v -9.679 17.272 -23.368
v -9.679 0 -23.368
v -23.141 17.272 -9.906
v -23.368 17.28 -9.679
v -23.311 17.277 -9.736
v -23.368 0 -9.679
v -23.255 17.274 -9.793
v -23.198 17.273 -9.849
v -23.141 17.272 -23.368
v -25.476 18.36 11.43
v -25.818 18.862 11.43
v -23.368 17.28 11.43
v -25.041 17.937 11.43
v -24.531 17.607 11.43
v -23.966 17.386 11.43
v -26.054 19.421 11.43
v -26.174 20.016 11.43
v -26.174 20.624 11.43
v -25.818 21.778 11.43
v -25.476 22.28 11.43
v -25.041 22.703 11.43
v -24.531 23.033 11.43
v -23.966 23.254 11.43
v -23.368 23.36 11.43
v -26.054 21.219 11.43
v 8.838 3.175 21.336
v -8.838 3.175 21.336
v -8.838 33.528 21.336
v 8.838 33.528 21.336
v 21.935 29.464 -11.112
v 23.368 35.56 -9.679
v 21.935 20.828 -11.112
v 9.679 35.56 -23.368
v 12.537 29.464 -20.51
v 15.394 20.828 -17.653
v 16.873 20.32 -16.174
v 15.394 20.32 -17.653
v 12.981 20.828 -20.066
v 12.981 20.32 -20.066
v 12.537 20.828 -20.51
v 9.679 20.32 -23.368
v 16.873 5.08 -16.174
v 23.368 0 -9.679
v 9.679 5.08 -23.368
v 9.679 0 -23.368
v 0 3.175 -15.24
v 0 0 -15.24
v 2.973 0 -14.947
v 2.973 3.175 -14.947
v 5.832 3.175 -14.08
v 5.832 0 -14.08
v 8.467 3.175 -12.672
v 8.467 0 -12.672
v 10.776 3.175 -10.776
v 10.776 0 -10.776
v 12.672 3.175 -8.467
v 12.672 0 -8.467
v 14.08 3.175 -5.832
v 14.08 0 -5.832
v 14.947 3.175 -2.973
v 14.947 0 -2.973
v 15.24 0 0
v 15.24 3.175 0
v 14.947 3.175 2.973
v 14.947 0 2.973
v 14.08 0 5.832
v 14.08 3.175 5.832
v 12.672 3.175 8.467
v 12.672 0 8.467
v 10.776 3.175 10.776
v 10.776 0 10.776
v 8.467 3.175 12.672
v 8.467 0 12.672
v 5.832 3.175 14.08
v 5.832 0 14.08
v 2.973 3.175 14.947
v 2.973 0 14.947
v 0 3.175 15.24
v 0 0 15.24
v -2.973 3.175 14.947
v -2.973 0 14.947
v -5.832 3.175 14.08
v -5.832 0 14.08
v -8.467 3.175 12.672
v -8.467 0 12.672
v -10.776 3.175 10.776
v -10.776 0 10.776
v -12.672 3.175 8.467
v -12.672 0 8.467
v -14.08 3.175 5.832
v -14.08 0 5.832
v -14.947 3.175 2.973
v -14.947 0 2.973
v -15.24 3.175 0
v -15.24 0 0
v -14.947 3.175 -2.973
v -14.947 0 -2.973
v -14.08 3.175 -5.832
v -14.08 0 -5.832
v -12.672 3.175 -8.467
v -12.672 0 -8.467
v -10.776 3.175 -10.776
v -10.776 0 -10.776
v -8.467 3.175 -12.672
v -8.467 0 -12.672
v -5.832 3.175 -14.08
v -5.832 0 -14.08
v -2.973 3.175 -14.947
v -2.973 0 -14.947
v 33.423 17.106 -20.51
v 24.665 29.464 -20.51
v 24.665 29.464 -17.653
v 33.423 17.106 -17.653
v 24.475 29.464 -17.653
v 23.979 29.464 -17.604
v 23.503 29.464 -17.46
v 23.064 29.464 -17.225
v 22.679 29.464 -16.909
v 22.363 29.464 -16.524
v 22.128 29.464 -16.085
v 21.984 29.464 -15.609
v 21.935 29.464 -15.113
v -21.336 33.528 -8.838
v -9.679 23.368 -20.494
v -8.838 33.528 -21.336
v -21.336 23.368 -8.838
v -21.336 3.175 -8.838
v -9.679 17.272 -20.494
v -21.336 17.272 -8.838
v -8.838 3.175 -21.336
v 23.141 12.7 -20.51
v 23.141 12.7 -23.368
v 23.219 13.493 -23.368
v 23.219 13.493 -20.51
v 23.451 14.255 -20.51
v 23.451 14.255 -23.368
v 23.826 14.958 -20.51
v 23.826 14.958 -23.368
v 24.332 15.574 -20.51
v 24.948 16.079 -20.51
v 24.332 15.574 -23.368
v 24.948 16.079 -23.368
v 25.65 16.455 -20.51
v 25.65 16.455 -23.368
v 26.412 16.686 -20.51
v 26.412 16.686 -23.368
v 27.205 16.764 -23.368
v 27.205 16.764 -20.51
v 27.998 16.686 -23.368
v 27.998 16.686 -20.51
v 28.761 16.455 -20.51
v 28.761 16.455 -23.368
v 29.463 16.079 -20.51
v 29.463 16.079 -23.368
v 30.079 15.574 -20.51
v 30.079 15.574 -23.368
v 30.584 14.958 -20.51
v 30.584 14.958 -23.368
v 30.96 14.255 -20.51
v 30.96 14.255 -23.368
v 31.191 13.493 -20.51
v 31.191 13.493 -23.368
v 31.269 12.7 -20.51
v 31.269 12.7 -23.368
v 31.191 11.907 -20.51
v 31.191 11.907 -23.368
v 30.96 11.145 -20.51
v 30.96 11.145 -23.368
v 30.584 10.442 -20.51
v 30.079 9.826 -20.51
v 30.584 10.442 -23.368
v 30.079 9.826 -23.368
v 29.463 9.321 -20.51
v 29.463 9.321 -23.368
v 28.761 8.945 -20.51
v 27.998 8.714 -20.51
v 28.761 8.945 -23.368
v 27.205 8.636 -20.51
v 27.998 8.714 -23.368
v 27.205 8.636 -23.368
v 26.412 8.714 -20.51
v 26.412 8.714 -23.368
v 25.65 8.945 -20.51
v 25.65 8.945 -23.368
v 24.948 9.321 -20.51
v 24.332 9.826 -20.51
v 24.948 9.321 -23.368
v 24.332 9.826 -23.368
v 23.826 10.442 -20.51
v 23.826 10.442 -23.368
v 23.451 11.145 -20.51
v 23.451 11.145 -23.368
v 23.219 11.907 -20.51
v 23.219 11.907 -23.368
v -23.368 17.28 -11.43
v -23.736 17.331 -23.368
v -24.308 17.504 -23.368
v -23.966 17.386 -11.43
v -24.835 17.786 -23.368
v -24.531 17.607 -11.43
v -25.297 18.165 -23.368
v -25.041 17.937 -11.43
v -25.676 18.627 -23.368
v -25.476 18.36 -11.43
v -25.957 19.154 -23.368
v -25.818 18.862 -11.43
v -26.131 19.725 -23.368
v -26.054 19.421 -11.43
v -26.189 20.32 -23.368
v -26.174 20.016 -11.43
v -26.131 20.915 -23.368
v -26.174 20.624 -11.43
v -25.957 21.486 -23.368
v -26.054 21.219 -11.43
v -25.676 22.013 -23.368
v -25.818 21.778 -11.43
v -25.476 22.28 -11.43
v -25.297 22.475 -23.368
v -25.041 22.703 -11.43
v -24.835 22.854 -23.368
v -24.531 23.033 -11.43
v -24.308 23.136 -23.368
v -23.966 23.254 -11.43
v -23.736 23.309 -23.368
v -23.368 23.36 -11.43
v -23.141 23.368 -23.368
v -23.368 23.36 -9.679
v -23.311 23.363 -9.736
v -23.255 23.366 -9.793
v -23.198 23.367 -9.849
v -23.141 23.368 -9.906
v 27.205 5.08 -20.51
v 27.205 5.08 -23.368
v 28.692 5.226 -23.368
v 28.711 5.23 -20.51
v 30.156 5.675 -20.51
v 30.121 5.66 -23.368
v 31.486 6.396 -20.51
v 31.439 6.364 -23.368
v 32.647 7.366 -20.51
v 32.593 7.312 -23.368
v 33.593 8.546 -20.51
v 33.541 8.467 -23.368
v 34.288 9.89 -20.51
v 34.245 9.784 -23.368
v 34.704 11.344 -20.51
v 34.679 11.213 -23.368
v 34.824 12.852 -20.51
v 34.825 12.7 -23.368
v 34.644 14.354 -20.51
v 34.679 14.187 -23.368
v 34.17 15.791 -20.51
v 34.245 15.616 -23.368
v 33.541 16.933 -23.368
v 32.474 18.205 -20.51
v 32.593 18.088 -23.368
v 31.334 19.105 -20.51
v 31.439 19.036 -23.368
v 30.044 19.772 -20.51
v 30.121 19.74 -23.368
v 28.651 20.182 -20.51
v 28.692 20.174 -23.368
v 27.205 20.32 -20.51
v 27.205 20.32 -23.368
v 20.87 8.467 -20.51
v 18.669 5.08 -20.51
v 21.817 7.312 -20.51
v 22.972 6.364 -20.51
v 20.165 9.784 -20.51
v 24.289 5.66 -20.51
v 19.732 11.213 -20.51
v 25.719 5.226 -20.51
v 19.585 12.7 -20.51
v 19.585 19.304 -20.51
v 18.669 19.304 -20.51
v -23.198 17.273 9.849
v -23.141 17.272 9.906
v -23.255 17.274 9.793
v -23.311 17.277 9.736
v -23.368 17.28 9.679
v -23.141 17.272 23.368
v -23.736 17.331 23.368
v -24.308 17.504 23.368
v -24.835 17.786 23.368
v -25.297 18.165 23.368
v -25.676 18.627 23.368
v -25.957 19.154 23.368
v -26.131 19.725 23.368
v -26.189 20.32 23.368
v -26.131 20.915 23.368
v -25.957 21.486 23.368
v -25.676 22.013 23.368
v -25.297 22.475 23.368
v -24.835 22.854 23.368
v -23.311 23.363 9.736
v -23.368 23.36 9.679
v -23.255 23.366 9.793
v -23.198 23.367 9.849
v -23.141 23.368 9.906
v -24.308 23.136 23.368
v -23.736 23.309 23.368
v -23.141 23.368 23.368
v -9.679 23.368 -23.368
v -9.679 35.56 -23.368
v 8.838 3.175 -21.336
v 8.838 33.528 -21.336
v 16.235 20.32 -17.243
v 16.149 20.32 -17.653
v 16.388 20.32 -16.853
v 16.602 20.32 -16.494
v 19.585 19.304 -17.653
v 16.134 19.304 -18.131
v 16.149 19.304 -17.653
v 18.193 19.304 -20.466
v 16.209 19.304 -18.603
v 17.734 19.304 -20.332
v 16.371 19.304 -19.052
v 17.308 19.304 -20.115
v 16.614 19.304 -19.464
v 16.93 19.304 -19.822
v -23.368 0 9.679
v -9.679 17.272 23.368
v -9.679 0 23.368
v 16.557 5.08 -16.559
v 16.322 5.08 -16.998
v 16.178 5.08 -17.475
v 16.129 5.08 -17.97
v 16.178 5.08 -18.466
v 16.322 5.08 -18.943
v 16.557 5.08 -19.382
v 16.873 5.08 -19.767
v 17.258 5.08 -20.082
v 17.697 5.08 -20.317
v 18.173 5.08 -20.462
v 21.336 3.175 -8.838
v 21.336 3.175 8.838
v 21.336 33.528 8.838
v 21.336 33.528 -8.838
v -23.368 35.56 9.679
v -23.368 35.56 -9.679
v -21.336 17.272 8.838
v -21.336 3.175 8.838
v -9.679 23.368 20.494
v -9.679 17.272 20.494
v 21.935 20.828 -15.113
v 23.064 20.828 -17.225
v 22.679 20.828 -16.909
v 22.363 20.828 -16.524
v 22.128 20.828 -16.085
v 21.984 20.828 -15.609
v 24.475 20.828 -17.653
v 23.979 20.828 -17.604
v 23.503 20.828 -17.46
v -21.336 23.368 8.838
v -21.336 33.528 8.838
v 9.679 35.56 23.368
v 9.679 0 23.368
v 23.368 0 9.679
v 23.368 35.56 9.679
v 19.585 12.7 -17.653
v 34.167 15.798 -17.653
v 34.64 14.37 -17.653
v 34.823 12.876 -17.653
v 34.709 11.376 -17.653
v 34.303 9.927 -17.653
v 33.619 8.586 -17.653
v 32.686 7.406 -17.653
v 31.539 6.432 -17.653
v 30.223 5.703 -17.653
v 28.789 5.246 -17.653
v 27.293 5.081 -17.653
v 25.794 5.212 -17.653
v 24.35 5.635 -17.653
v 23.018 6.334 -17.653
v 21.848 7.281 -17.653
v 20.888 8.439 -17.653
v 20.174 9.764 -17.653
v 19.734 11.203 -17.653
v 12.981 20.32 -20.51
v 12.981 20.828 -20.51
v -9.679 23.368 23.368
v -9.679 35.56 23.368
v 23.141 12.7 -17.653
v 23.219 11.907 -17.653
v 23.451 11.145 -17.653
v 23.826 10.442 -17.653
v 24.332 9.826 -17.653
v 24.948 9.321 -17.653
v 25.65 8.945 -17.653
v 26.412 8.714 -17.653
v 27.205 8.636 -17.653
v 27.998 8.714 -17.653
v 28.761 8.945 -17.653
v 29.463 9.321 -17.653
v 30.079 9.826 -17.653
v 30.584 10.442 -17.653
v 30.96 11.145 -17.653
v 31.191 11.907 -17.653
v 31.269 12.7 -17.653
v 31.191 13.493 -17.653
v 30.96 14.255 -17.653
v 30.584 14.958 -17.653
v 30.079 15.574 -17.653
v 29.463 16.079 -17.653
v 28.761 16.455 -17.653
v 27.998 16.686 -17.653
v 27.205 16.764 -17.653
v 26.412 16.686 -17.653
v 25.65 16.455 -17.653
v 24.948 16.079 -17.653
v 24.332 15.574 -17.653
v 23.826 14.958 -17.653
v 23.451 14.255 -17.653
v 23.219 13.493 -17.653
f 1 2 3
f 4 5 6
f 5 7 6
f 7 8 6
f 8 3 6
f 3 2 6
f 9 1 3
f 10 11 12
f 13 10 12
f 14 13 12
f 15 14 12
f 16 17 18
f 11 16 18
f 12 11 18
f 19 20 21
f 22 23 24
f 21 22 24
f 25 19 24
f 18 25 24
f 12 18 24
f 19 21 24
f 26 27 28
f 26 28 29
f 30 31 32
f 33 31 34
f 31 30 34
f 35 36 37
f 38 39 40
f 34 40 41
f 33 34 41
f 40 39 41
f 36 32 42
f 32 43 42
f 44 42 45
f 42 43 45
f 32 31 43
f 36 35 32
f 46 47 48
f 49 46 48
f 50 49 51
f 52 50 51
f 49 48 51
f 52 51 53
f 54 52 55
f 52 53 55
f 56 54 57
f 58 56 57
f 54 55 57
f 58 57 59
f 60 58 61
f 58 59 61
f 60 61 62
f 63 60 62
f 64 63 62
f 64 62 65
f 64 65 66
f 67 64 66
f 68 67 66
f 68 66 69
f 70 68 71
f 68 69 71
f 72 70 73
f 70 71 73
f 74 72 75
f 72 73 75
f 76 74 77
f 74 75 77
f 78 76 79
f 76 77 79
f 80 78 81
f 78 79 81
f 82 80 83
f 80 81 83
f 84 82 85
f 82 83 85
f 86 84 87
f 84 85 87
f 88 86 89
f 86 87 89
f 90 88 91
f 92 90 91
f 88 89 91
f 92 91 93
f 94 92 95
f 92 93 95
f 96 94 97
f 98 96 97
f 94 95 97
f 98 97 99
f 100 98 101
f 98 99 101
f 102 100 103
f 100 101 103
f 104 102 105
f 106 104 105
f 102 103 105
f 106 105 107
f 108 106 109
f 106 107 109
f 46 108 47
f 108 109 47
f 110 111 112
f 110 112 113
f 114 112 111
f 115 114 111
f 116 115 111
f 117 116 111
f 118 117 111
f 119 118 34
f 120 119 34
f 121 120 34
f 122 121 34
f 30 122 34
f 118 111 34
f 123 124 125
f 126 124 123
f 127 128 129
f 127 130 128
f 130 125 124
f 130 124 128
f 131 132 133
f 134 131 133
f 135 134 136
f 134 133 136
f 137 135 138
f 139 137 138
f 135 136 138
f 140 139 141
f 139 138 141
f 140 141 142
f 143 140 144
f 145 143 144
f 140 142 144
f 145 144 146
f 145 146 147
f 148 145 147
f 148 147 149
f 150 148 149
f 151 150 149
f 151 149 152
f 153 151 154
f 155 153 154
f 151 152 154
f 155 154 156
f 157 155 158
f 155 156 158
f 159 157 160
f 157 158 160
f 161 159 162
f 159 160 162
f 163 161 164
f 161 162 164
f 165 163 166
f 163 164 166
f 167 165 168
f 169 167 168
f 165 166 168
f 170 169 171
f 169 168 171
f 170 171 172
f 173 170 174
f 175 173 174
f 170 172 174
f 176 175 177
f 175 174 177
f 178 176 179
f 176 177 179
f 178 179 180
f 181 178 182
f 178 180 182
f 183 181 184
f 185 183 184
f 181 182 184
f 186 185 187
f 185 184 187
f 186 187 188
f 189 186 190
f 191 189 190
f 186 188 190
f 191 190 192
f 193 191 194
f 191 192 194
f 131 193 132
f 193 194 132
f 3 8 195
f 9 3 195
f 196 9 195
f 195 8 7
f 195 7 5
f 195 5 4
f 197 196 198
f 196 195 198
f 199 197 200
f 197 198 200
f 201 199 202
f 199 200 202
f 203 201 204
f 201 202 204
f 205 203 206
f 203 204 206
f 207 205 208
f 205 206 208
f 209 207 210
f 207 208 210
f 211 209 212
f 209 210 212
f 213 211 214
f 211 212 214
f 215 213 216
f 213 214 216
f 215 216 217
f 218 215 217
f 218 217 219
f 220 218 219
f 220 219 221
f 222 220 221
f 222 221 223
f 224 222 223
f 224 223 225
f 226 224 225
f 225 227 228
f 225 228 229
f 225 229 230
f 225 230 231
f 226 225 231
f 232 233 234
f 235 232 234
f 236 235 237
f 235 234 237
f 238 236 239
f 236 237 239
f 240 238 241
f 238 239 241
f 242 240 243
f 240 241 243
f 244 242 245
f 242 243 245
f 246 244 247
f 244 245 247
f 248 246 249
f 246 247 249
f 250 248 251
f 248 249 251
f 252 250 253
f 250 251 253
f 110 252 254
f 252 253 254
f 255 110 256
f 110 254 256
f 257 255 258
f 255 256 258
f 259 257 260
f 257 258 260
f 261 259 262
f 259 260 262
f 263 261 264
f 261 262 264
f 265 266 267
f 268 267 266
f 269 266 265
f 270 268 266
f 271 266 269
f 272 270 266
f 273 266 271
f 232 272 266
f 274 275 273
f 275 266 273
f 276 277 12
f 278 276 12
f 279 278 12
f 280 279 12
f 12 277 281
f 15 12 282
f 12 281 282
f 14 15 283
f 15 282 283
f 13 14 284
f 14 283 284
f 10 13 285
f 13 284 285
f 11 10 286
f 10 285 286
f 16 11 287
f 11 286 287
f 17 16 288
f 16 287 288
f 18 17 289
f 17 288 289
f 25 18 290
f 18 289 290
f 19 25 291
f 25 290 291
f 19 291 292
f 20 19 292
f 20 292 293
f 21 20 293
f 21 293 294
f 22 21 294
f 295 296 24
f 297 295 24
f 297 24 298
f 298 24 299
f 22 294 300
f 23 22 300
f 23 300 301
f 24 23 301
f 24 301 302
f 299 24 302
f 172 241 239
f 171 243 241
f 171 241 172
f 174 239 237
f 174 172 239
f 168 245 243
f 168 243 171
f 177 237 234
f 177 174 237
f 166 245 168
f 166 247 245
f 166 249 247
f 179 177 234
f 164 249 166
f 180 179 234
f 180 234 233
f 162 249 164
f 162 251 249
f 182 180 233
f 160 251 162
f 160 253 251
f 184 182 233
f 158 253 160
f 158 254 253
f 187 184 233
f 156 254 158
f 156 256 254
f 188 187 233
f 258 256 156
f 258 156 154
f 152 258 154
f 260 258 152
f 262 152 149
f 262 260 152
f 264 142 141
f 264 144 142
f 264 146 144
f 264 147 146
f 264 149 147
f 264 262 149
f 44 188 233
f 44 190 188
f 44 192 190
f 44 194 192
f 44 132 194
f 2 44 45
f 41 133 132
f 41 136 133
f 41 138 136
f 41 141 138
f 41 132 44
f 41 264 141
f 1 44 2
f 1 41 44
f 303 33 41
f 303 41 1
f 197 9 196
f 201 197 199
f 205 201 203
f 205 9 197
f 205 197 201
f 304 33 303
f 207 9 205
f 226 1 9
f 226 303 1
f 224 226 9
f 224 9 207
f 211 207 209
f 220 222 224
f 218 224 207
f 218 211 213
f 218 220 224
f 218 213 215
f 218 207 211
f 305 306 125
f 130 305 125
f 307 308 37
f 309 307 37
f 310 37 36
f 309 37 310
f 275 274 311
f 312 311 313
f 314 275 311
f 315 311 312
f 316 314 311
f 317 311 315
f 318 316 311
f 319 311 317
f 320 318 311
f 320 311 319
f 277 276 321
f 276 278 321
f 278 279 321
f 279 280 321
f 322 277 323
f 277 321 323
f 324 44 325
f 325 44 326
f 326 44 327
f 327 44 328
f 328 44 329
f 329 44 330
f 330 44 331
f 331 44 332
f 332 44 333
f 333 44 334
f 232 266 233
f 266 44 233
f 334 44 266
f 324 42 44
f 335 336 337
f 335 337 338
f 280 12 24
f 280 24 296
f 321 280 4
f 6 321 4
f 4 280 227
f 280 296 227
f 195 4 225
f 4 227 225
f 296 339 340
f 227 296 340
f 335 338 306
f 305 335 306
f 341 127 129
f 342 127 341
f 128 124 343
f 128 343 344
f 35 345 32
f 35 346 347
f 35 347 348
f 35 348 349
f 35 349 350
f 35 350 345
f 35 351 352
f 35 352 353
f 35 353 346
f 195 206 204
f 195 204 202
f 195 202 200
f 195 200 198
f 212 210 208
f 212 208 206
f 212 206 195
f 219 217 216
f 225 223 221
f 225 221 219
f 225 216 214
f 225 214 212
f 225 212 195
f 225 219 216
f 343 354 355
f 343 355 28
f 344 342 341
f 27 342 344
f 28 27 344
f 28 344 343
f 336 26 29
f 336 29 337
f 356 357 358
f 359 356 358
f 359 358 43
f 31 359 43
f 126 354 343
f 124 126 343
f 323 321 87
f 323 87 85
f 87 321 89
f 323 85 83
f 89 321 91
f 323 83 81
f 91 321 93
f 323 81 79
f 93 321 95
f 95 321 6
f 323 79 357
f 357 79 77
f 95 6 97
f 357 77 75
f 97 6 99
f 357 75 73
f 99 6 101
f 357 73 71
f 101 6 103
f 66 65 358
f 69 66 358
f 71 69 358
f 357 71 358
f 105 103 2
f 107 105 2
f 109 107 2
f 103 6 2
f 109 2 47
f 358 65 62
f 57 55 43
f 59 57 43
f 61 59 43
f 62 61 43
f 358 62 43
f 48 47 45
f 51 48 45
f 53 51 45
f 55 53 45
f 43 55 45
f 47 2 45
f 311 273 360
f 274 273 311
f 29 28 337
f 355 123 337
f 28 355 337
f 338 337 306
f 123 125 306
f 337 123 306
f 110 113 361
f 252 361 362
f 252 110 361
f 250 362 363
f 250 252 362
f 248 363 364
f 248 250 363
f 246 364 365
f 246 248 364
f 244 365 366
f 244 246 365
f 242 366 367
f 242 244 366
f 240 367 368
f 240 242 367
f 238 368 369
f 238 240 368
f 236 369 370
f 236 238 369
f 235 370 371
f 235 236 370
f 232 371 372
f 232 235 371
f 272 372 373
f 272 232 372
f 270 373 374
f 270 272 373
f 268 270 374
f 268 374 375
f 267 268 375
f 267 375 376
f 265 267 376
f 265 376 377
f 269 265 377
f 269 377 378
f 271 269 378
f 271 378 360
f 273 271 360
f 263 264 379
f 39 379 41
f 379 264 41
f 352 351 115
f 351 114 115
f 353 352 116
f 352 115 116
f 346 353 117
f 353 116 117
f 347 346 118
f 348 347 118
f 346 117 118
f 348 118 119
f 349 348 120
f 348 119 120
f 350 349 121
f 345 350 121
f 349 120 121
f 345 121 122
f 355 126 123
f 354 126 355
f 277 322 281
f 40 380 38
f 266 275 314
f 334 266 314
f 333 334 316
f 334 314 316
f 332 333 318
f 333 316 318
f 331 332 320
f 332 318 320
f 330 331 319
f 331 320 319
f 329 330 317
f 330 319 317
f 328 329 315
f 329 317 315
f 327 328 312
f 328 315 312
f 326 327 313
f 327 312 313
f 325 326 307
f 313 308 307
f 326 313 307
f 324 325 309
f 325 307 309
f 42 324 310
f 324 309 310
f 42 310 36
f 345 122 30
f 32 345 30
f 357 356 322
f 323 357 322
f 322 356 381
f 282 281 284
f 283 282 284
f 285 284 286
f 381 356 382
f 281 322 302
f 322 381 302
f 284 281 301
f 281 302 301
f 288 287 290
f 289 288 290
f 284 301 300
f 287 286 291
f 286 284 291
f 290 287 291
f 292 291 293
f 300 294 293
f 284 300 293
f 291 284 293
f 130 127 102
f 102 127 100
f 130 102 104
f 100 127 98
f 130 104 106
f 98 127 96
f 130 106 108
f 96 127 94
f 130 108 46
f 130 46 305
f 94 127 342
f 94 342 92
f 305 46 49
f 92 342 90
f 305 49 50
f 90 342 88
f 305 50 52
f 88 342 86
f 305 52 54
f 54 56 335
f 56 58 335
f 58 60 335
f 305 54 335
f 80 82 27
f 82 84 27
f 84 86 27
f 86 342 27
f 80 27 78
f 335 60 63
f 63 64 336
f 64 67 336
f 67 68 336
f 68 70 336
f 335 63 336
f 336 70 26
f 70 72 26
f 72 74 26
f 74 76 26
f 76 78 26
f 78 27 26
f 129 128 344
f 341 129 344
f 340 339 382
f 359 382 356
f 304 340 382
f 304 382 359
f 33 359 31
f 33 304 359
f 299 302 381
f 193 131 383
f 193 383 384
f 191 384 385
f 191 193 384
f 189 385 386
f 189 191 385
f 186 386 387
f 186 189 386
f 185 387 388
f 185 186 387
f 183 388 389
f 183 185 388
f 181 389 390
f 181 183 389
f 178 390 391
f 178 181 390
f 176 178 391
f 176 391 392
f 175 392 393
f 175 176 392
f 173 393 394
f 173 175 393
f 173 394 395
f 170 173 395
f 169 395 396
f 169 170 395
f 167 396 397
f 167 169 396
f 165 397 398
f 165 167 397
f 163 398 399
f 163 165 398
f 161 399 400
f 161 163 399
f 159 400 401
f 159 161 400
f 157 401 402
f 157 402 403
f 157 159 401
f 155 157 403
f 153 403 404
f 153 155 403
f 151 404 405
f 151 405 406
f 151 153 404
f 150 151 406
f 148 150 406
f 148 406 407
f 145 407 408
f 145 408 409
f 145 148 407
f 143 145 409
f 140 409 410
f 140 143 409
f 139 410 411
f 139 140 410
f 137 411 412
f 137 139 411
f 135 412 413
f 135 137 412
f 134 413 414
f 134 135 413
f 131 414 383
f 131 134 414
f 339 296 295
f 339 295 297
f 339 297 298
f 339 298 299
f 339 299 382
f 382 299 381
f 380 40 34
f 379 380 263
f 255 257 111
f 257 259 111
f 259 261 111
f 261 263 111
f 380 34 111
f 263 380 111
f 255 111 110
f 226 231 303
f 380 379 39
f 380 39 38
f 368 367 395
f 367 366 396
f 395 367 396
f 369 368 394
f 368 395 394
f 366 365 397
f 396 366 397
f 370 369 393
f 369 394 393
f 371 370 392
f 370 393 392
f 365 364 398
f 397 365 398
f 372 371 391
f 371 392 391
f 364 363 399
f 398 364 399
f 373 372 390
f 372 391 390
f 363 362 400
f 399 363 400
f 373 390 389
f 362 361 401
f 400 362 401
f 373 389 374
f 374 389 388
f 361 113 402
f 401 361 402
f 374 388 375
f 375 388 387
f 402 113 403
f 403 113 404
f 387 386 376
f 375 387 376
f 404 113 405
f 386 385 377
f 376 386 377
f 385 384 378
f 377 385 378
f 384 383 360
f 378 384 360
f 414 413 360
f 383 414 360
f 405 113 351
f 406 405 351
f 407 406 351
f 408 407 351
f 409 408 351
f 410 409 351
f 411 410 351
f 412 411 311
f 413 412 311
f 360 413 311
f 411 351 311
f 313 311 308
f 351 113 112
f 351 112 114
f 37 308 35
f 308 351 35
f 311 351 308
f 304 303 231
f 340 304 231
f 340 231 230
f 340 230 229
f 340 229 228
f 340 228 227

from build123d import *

# Parameters (mm, degrees)
BOSS_EXTRUDE1_DEPTH  = 35.56
SHELL1_T             = -2.032
SKETCH2_R            = 15.24
BOSS_EXTRUDE2_DEPTH  = 3.175
SKETCH3_R            = 4.064
BOSS_EXTRUDE3_DEPTH  = 2.8575
FILLET2_R            = 2.54
SKETCH4_R            = 4.064
BOSS_EXTRUDE10_DEPTH = 2.8575
BOSS_EXTRUDE11_DEPTH = 8.636
FILLET3_R            = 2.54
BOSS_EXTRUDE12_DEPTH = 46.736
SKETCH8_W            = 5.08
SKETCH8_H            = 22.86
CUT_EXTRUDE1_DEPTH   = 55.98528445


with BuildPart() as part:
    # Sketch1 → Boss-Extrude1 (new body)
    with BuildSketch(Plane(origin=(0, 0, 0), x_dir=(1, 0, 0), z_dir=(0, 1, 0))):
        Polygon((9.679342526, -23.368), (23.368, -9.679342526), (23.368, 9.679342526), (9.679342526, 23.368), (-9.679342526, 23.368), (-23.368, 9.679342526), (-23.368, -9.679342526), (-9.679342526, -23.368), align=None)
    extrude(amount=BOSS_EXTRUDE1_DEPTH)

    # Shell1
    shell1_openings = [part.faces().sort_by_distance(p)[0] for p in [
        (0, 0, 0),
    ]]
    offset(amount=SHELL1_T, openings=shell1_openings, kind=Kind.INTERSECTION)

    # Sketch2 → Boss-Extrude2 (add)
    with BuildSketch(Plane.XZ):
        Polygon((23.368, 9.679342526), (9.679342526, 23.368), (-9.679342526, 23.368), (-23.368, 9.679342526), (-23.368, -9.679342526), (-9.679342526, -23.368), (9.679342526, -23.368), (23.368, -9.679342526), align=None)
        with Locations(Location((0, 0, 0), (0, 0, 270))):
            Circle(SKETCH2_R, mode=Mode.SUBTRACT)
    extrude(amount=-BOSS_EXTRUDE2_DEPTH)

    # Sketch3 → Boss-Extrude3 (add)
    with BuildSketch(Plane(origin=(0, 0, -23.368), x_dir=(-1, 0, 0), z_dir=(0, 0, -1))):
        with BuildLine():
            Line((-9.679342526, 5.08), (-27.205342526, 5.08))
            ThreePointArc((-27.205342526, 5.08), (-34.825342526, 12.7), (-27.205342526, 20.32))
            Line((-27.205342526, 20.32), (-9.679342526, 20.32))
            Line((-9.679342526, 20.32), (-9.679342526, 5.08))
        make_face()
        with Locations((-27.205342526, 12.7)):
            Circle(SKETCH3_R, mode=Mode.SUBTRACT)
    extrude(amount=-BOSS_EXTRUDE3_DEPTH)

    # Fillet2
    fillet2_edges = [part.edges().sort_by_distance(p)[0] for p in [
        (12.536842526, 12.7, -20.5105),
    ]]
    fillet(fillet2_edges, radius=FILLET2_R)

    # Sketch4 → Boss-Extrude10 (add)
    with BuildSketch(Plane.XY.offset(-20.5105)):
        with BuildLine():
            Line((12.981342526, 19.304), (12.981342526, 29.464))
            Line((12.981342526, 29.464), (24.665342526, 29.464))
            Line((24.665342526, 29.464), (33.422629122, 17.105649484))
            ThreePointArc((33.422629122, 17.105649484), (29.517124969, 5.439141791), (19.585342526, 12.7))
            Line((19.585342526, 12.7), (19.585342526, 19.304))
            Line((19.585342526, 19.304), (12.981342526, 19.304))
        make_face()
        with Locations(Location((27.205342526, 12.7, 0), (0, 0, 180))):
            Circle(SKETCH4_R, mode=Mode.SUBTRACT)
    extrude(amount=BOSS_EXTRUDE10_DEPTH)

    # Sketch5 → Boss-Extrude11 (add)
    with BuildSketch(Plane(origin=(0, 29.464, 0), x_dir=(1, 0, 0), z_dir=(0, 1, 0))):
        Polygon((12.536842526, 20.5105), (21.934842526, 20.5105), (21.934842526, 11.1125), align=None)
    extrude(amount=-BOSS_EXTRUDE11_DEPTH)

    # Fillet3
    fillet3_edges = [part.edges().sort_by_distance(p)[0] for p in [
        (21.934842526, 25.146, -17.653),
    ]]
    fillet(fillet3_edges, radius=FILLET3_R)

    # Sketch6 → Boss-Extrude12 (add, through all)
    with BuildSketch(Plane.XY.offset(23.368)):
        with BuildLine():
            Line((-9.679342526, 17.272), (-23.141342526, 17.272))
            ThreePointArc((-23.141342526, 17.272), (-26.189342526, 20.32), (-23.141342526, 23.368))
            Line((-23.141342526, 23.368), (-9.679342526, 23.368))
            Line((-9.679342526, 23.368), (-9.679342526, 17.272))
        make_face()
    extrude(amount=-BOSS_EXTRUDE12_DEPTH)

    # Sketch8 → Cut-Extrude1 (cut, through all)
    with BuildSketch(Plane(origin=(0, 35.56, 0), x_dir=(1, 0, 0), z_dir=(0, 1, 0))):
        with Locations((-25.908, 0)):
            Rectangle(SKETCH8_W, SKETCH8_H)
    extrude(amount=-CUT_EXTRUDE1_DEPTH, mode=Mode.SUBTRACT)


solid = part.part
